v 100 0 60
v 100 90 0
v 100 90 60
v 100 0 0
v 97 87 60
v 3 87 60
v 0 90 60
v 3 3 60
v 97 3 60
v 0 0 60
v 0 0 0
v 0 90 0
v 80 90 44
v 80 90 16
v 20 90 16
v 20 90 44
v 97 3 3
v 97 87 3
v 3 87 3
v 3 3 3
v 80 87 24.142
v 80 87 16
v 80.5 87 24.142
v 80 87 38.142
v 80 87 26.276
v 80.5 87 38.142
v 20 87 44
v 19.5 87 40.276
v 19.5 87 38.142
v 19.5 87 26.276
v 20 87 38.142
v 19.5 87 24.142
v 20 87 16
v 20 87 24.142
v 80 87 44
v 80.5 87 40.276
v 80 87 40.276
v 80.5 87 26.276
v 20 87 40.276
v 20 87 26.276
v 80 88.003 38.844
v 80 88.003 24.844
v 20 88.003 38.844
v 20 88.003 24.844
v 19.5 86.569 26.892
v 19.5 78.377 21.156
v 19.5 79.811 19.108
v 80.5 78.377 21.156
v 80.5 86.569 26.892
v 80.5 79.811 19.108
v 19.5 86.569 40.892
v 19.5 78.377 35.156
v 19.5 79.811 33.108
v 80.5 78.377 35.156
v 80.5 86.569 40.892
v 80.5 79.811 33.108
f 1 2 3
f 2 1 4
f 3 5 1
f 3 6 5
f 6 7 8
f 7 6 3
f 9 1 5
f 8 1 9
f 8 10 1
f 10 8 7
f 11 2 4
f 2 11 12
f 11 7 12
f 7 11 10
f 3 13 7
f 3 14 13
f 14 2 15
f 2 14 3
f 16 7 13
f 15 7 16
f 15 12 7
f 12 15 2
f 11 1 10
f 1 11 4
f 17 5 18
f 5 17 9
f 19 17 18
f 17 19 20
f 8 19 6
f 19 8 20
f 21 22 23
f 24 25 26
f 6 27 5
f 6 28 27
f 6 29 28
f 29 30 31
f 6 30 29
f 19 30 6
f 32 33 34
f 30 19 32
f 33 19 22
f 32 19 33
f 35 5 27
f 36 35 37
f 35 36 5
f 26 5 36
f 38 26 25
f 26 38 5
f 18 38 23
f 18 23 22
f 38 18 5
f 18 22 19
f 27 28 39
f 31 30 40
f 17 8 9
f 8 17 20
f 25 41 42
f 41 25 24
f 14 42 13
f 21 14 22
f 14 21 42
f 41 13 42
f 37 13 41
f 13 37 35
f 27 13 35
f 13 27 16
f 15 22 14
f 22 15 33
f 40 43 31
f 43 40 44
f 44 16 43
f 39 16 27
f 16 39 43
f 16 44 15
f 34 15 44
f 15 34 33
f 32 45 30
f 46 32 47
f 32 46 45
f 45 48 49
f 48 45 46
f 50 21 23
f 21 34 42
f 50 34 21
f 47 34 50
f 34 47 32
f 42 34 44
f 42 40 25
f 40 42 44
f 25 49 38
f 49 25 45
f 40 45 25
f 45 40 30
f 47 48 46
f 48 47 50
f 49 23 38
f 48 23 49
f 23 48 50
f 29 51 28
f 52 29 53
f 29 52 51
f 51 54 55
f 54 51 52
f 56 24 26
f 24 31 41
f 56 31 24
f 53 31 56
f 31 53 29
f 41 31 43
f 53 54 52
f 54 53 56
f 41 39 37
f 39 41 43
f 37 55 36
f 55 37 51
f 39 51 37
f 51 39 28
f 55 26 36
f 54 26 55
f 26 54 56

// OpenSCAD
$fn = 32;

// ----------------------------------------------------------------------
// Vent box: louvers enclosure
// ----------------------------------------------------------------------

// --- parameters (mm) ---
box_l = 100;              // box length, X
box_w = 90;               // box width, Y
box_h = 60;               // box height, Z
wall_t = 3;               // shell wall thickness
win_l = 60;               // vent window width, X
win_h = 28;               // vent window height, Z
slat_t = 2.5;             // louver slat thickness
slat_d = 10;              // louver slat depth
slat_a = 35;              // louver slat angle, degrees
slat_pitch = 14;          // louver pitch
slat_yc = 83.19;          // slat centreline Y
fit_tol = 0.1;            // tolerance for press fits, mm
free_tol = 0.3;           // tolerance for clearance fits, mm

win_z0 = (box_h - win_h) / 2;  // window lower edge Z
n_slats = 2;  // louver count
slat_z0 = win_z0 + (win_h - (n_slats - 1) * slat_pitch) / 2;

difference() {
  union() {
    difference() {
      cube([box_l, box_w, box_h]);
  translate([wall_t, wall_t, wall_t])
    cube([box_l - 2 * wall_t, box_w - 2 * wall_t, box_h]);
  translate([(box_l - win_l) / 2, box_w - wall_t - 1, win_z0])
    cube([win_l, wall_t + 2, win_h]);
    }
    for (i = [0 : n_slats - 1])
      translate([box_l / 2, slat_yc, slat_z0 + i * slat_pitch])
        rotate([slat_a, 0, 0])
          cube([win_l + 1, slat_d, slat_t], center = true);
  }
}
